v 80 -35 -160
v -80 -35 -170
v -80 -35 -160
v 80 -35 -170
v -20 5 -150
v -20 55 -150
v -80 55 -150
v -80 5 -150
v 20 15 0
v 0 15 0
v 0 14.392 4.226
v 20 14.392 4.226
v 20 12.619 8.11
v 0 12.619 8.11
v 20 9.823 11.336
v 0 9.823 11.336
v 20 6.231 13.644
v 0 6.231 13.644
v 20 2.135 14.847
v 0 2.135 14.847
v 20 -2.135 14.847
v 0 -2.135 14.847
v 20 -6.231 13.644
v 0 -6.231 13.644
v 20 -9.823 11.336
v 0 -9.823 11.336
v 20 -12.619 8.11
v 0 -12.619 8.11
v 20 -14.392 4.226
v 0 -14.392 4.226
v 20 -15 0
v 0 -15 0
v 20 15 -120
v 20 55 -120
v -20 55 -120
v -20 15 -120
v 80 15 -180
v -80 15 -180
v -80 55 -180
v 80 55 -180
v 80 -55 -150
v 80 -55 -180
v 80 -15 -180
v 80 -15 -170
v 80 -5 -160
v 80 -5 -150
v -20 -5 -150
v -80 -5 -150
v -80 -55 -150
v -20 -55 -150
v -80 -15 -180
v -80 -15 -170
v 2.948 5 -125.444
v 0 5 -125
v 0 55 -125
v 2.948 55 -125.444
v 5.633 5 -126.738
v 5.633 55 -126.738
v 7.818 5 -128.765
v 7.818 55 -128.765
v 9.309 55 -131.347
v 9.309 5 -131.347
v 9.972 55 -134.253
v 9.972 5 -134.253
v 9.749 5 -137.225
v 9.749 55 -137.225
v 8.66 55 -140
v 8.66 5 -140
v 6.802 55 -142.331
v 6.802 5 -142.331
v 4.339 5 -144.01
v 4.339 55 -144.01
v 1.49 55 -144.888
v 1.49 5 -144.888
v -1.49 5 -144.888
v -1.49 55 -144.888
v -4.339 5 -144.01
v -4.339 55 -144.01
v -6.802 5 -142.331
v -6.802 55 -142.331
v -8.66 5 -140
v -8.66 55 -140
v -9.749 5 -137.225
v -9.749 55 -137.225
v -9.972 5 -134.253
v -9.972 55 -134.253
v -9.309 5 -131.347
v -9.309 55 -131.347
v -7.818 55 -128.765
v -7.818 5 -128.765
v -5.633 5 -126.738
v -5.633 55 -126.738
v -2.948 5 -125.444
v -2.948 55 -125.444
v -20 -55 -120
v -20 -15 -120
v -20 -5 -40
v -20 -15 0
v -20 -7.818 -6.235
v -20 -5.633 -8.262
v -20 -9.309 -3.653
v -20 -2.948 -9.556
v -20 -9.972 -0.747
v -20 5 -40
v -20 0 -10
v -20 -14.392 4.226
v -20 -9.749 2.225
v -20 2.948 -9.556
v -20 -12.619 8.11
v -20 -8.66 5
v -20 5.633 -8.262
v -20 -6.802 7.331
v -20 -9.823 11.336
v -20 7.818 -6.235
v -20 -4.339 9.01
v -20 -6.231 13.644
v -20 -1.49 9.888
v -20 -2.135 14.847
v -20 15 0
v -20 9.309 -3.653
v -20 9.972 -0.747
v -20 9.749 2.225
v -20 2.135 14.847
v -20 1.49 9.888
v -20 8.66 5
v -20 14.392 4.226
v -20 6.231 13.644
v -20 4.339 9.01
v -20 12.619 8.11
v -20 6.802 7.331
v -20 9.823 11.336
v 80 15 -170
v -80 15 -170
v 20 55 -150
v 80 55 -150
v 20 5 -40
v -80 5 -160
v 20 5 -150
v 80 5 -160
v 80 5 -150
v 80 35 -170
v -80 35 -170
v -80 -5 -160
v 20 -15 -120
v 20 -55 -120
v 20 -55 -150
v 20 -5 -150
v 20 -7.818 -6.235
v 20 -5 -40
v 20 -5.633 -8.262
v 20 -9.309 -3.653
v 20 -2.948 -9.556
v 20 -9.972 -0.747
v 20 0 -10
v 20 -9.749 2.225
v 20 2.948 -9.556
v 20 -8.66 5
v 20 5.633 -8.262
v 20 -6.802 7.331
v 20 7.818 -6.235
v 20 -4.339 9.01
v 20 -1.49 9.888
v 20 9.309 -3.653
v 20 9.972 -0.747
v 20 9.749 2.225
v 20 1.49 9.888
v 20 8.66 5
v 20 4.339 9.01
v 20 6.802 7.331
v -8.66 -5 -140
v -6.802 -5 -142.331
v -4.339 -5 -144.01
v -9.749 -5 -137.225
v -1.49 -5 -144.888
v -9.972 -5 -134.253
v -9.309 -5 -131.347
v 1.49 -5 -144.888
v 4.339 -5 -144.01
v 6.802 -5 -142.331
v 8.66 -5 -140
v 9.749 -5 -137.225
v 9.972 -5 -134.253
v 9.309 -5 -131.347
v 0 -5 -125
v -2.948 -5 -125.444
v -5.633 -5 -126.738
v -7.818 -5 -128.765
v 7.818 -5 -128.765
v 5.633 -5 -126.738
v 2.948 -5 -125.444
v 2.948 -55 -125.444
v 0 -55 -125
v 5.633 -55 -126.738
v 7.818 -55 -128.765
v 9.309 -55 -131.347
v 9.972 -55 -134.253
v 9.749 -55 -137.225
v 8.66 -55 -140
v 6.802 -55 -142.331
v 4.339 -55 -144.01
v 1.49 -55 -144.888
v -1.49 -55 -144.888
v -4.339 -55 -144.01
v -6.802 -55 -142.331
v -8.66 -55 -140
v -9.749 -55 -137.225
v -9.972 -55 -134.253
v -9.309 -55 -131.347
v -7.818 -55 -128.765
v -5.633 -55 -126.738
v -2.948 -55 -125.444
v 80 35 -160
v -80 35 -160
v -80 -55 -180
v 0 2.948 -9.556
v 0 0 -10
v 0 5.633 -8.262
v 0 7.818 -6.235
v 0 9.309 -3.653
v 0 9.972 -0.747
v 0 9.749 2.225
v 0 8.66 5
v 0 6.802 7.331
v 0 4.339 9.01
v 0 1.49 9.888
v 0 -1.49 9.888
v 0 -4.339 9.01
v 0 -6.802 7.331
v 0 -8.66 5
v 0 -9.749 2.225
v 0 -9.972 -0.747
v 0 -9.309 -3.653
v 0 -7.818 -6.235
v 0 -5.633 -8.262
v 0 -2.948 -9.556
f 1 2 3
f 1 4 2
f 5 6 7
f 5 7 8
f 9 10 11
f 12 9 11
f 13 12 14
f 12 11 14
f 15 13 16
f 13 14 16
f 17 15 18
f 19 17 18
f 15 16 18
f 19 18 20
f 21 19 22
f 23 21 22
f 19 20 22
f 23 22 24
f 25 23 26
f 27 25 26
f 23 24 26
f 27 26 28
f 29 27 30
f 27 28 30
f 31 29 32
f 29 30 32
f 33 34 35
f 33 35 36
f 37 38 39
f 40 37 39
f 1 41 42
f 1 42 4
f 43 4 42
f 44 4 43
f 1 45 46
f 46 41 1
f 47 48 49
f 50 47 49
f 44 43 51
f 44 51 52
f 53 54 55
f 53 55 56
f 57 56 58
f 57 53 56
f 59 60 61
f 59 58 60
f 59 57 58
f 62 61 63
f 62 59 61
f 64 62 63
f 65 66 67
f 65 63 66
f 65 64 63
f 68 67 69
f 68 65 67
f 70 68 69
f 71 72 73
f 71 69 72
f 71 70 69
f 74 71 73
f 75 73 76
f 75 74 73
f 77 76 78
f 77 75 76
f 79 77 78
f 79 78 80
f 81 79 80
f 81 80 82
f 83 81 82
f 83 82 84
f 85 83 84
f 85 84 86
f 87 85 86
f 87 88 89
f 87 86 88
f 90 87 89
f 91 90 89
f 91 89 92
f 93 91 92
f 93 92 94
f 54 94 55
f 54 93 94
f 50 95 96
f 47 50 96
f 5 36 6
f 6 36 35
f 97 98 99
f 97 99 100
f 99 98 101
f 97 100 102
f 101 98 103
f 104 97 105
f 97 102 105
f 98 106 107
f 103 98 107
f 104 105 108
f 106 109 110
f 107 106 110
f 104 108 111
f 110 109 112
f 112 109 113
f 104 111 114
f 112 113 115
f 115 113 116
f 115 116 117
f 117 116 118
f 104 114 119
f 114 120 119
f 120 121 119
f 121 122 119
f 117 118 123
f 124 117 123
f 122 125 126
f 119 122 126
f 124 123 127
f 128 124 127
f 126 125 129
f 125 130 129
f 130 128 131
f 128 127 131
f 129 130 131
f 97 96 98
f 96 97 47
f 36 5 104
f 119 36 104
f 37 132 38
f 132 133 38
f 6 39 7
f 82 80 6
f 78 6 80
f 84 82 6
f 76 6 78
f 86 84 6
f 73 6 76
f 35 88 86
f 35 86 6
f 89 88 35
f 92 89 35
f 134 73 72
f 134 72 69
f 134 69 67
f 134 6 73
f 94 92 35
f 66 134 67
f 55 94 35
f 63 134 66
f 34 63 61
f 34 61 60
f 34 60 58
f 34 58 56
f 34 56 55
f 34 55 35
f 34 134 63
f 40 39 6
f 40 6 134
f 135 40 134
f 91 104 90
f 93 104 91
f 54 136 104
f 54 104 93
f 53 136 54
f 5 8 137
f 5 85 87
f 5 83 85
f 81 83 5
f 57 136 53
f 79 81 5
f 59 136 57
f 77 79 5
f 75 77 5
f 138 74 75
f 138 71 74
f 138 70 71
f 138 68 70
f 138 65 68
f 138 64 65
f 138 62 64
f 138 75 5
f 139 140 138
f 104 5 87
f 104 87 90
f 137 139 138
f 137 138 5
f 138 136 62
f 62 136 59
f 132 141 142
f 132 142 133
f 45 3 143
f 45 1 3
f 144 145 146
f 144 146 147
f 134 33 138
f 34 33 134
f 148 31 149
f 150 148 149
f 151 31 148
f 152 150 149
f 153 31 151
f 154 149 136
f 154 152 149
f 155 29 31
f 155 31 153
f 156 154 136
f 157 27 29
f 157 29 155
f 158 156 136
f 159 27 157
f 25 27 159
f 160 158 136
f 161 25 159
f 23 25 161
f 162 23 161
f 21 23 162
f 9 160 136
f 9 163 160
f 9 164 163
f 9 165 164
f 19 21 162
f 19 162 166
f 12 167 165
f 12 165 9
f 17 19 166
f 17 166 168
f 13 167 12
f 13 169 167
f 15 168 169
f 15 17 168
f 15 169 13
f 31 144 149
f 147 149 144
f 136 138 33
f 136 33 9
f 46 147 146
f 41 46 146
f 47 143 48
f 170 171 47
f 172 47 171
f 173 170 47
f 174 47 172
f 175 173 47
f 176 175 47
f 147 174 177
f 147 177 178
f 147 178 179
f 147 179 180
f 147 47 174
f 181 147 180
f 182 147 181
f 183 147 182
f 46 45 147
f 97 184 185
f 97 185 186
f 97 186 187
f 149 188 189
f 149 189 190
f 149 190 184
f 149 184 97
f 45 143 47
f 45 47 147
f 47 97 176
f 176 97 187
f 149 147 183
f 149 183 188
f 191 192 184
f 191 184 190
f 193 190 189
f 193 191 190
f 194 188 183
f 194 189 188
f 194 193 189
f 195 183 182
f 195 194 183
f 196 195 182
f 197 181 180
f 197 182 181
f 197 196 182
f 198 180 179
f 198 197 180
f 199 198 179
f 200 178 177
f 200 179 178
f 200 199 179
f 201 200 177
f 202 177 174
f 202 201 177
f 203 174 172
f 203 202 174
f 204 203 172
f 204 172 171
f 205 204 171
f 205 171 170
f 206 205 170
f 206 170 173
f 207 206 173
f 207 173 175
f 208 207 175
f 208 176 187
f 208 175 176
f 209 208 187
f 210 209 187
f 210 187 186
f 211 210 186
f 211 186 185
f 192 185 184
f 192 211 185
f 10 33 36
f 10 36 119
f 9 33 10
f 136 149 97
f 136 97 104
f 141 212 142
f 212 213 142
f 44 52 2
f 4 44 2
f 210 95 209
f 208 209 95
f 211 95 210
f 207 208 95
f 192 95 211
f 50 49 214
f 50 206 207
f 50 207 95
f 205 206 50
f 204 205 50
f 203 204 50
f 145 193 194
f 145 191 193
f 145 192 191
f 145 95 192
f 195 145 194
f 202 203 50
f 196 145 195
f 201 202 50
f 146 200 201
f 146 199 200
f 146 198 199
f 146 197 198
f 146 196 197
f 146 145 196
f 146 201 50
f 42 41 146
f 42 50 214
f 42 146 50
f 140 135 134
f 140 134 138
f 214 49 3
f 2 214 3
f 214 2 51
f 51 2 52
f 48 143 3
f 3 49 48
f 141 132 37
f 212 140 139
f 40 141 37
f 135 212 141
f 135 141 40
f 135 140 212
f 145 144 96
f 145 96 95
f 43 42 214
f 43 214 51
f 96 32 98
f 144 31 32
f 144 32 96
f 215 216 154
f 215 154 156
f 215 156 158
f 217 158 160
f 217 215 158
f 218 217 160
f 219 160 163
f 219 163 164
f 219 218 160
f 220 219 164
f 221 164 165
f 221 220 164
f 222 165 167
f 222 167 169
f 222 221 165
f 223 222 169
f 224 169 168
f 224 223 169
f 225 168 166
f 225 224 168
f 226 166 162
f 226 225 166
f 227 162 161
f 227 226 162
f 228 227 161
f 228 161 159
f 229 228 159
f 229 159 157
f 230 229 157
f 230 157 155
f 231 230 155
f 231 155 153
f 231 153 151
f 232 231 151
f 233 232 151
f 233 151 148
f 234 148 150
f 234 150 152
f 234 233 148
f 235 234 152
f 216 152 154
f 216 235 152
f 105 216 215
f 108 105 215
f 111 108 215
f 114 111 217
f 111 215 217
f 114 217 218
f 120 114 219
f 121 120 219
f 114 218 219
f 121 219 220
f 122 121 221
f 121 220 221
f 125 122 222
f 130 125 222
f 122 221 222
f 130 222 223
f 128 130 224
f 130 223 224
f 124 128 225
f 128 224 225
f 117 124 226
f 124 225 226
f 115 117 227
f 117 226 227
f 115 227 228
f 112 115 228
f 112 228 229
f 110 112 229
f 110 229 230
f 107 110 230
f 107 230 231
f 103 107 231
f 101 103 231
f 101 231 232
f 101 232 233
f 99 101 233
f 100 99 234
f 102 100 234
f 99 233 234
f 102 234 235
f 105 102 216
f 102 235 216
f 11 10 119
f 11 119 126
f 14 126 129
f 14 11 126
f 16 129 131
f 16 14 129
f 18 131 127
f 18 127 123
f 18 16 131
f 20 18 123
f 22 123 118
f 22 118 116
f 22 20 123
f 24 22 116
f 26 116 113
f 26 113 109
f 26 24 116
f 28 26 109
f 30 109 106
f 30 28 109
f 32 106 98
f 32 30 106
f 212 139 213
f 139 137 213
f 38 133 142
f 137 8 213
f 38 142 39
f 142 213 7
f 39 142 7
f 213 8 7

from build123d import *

# Parameters (mm, degrees)
SKETCH1_R               = 10
BOSS_EXTRUDE1_DEPTH     = 20
BOSS_EXTRUDE2_DEPTH     = 80
CUT_EXTRUDE1_DEPTH      = 226.610283454
CUT_EXTRUDE1_DEPTH_BACK = 226.610283454
SKETCH2_R               = 10


with BuildPart() as part:
    # Sketch1 → Boss-Extrude1 (new, symmetric)
    with BuildSketch(Plane.YZ):
        with BuildLine():
            Line((15, -120), (15, 0))
            ThreePointArc((15, 0), (0, 15), (-15, 0))
            Line((-15, 0), (-15, -120))
            Line((-15, -120), (-55, -120))
            Line((-55, -120), (-55, -150))
            Line((-55, -150), (-5, -150))
            Line((-5, -150), (-5, -40))
            Line((-5, -40), (5, -40))
            Line((5, -40), (5, -150))
            Line((5, -150), (55, -150))
            Line((55, -150), (55, -120))
            Line((55, -120), (15, -120))
        make_face()
        Circle(SKETCH1_R, mode=Mode.SUBTRACT)
    extrude(amount=BOSS_EXTRUDE1_DEPTH, both=True)

    # Sketch1<3> → Boss-Extrude2 (add, symmetric)
    with BuildSketch(Plane.YZ):
        Polygon((-5, -150), (-55, -150), (-55, -180), (-15, -180), (-15, -170), (-35, -170), (-35, -160), (-5, -160), align=None)
        Polygon((55, -180), (55, -150), (5, -150), (5, -160), (35, -160), (35, -170), (15, -170), (15, -180), align=None)
    extrude(amount=BOSS_EXTRUDE2_DEPTH, both=True)

    # Sketch2 → Cut-Extrude1 (cut, two sides: drawn at the far end of the back side and taken through both)
    with BuildSketch(Plane(origin=(0, 55, 0), x_dir=(-1, 0, 0), z_dir=(0, 1, 0)).offset(-CUT_EXTRUDE1_DEPTH_BACK)):
        with Locations((0, -135)):
            Circle(SKETCH2_R)
    extrude(amount=CUT_EXTRUDE1_DEPTH + CUT_EXTRUDE1_DEPTH_BACK, mode=Mode.SUBTRACT)


solid = part.part
